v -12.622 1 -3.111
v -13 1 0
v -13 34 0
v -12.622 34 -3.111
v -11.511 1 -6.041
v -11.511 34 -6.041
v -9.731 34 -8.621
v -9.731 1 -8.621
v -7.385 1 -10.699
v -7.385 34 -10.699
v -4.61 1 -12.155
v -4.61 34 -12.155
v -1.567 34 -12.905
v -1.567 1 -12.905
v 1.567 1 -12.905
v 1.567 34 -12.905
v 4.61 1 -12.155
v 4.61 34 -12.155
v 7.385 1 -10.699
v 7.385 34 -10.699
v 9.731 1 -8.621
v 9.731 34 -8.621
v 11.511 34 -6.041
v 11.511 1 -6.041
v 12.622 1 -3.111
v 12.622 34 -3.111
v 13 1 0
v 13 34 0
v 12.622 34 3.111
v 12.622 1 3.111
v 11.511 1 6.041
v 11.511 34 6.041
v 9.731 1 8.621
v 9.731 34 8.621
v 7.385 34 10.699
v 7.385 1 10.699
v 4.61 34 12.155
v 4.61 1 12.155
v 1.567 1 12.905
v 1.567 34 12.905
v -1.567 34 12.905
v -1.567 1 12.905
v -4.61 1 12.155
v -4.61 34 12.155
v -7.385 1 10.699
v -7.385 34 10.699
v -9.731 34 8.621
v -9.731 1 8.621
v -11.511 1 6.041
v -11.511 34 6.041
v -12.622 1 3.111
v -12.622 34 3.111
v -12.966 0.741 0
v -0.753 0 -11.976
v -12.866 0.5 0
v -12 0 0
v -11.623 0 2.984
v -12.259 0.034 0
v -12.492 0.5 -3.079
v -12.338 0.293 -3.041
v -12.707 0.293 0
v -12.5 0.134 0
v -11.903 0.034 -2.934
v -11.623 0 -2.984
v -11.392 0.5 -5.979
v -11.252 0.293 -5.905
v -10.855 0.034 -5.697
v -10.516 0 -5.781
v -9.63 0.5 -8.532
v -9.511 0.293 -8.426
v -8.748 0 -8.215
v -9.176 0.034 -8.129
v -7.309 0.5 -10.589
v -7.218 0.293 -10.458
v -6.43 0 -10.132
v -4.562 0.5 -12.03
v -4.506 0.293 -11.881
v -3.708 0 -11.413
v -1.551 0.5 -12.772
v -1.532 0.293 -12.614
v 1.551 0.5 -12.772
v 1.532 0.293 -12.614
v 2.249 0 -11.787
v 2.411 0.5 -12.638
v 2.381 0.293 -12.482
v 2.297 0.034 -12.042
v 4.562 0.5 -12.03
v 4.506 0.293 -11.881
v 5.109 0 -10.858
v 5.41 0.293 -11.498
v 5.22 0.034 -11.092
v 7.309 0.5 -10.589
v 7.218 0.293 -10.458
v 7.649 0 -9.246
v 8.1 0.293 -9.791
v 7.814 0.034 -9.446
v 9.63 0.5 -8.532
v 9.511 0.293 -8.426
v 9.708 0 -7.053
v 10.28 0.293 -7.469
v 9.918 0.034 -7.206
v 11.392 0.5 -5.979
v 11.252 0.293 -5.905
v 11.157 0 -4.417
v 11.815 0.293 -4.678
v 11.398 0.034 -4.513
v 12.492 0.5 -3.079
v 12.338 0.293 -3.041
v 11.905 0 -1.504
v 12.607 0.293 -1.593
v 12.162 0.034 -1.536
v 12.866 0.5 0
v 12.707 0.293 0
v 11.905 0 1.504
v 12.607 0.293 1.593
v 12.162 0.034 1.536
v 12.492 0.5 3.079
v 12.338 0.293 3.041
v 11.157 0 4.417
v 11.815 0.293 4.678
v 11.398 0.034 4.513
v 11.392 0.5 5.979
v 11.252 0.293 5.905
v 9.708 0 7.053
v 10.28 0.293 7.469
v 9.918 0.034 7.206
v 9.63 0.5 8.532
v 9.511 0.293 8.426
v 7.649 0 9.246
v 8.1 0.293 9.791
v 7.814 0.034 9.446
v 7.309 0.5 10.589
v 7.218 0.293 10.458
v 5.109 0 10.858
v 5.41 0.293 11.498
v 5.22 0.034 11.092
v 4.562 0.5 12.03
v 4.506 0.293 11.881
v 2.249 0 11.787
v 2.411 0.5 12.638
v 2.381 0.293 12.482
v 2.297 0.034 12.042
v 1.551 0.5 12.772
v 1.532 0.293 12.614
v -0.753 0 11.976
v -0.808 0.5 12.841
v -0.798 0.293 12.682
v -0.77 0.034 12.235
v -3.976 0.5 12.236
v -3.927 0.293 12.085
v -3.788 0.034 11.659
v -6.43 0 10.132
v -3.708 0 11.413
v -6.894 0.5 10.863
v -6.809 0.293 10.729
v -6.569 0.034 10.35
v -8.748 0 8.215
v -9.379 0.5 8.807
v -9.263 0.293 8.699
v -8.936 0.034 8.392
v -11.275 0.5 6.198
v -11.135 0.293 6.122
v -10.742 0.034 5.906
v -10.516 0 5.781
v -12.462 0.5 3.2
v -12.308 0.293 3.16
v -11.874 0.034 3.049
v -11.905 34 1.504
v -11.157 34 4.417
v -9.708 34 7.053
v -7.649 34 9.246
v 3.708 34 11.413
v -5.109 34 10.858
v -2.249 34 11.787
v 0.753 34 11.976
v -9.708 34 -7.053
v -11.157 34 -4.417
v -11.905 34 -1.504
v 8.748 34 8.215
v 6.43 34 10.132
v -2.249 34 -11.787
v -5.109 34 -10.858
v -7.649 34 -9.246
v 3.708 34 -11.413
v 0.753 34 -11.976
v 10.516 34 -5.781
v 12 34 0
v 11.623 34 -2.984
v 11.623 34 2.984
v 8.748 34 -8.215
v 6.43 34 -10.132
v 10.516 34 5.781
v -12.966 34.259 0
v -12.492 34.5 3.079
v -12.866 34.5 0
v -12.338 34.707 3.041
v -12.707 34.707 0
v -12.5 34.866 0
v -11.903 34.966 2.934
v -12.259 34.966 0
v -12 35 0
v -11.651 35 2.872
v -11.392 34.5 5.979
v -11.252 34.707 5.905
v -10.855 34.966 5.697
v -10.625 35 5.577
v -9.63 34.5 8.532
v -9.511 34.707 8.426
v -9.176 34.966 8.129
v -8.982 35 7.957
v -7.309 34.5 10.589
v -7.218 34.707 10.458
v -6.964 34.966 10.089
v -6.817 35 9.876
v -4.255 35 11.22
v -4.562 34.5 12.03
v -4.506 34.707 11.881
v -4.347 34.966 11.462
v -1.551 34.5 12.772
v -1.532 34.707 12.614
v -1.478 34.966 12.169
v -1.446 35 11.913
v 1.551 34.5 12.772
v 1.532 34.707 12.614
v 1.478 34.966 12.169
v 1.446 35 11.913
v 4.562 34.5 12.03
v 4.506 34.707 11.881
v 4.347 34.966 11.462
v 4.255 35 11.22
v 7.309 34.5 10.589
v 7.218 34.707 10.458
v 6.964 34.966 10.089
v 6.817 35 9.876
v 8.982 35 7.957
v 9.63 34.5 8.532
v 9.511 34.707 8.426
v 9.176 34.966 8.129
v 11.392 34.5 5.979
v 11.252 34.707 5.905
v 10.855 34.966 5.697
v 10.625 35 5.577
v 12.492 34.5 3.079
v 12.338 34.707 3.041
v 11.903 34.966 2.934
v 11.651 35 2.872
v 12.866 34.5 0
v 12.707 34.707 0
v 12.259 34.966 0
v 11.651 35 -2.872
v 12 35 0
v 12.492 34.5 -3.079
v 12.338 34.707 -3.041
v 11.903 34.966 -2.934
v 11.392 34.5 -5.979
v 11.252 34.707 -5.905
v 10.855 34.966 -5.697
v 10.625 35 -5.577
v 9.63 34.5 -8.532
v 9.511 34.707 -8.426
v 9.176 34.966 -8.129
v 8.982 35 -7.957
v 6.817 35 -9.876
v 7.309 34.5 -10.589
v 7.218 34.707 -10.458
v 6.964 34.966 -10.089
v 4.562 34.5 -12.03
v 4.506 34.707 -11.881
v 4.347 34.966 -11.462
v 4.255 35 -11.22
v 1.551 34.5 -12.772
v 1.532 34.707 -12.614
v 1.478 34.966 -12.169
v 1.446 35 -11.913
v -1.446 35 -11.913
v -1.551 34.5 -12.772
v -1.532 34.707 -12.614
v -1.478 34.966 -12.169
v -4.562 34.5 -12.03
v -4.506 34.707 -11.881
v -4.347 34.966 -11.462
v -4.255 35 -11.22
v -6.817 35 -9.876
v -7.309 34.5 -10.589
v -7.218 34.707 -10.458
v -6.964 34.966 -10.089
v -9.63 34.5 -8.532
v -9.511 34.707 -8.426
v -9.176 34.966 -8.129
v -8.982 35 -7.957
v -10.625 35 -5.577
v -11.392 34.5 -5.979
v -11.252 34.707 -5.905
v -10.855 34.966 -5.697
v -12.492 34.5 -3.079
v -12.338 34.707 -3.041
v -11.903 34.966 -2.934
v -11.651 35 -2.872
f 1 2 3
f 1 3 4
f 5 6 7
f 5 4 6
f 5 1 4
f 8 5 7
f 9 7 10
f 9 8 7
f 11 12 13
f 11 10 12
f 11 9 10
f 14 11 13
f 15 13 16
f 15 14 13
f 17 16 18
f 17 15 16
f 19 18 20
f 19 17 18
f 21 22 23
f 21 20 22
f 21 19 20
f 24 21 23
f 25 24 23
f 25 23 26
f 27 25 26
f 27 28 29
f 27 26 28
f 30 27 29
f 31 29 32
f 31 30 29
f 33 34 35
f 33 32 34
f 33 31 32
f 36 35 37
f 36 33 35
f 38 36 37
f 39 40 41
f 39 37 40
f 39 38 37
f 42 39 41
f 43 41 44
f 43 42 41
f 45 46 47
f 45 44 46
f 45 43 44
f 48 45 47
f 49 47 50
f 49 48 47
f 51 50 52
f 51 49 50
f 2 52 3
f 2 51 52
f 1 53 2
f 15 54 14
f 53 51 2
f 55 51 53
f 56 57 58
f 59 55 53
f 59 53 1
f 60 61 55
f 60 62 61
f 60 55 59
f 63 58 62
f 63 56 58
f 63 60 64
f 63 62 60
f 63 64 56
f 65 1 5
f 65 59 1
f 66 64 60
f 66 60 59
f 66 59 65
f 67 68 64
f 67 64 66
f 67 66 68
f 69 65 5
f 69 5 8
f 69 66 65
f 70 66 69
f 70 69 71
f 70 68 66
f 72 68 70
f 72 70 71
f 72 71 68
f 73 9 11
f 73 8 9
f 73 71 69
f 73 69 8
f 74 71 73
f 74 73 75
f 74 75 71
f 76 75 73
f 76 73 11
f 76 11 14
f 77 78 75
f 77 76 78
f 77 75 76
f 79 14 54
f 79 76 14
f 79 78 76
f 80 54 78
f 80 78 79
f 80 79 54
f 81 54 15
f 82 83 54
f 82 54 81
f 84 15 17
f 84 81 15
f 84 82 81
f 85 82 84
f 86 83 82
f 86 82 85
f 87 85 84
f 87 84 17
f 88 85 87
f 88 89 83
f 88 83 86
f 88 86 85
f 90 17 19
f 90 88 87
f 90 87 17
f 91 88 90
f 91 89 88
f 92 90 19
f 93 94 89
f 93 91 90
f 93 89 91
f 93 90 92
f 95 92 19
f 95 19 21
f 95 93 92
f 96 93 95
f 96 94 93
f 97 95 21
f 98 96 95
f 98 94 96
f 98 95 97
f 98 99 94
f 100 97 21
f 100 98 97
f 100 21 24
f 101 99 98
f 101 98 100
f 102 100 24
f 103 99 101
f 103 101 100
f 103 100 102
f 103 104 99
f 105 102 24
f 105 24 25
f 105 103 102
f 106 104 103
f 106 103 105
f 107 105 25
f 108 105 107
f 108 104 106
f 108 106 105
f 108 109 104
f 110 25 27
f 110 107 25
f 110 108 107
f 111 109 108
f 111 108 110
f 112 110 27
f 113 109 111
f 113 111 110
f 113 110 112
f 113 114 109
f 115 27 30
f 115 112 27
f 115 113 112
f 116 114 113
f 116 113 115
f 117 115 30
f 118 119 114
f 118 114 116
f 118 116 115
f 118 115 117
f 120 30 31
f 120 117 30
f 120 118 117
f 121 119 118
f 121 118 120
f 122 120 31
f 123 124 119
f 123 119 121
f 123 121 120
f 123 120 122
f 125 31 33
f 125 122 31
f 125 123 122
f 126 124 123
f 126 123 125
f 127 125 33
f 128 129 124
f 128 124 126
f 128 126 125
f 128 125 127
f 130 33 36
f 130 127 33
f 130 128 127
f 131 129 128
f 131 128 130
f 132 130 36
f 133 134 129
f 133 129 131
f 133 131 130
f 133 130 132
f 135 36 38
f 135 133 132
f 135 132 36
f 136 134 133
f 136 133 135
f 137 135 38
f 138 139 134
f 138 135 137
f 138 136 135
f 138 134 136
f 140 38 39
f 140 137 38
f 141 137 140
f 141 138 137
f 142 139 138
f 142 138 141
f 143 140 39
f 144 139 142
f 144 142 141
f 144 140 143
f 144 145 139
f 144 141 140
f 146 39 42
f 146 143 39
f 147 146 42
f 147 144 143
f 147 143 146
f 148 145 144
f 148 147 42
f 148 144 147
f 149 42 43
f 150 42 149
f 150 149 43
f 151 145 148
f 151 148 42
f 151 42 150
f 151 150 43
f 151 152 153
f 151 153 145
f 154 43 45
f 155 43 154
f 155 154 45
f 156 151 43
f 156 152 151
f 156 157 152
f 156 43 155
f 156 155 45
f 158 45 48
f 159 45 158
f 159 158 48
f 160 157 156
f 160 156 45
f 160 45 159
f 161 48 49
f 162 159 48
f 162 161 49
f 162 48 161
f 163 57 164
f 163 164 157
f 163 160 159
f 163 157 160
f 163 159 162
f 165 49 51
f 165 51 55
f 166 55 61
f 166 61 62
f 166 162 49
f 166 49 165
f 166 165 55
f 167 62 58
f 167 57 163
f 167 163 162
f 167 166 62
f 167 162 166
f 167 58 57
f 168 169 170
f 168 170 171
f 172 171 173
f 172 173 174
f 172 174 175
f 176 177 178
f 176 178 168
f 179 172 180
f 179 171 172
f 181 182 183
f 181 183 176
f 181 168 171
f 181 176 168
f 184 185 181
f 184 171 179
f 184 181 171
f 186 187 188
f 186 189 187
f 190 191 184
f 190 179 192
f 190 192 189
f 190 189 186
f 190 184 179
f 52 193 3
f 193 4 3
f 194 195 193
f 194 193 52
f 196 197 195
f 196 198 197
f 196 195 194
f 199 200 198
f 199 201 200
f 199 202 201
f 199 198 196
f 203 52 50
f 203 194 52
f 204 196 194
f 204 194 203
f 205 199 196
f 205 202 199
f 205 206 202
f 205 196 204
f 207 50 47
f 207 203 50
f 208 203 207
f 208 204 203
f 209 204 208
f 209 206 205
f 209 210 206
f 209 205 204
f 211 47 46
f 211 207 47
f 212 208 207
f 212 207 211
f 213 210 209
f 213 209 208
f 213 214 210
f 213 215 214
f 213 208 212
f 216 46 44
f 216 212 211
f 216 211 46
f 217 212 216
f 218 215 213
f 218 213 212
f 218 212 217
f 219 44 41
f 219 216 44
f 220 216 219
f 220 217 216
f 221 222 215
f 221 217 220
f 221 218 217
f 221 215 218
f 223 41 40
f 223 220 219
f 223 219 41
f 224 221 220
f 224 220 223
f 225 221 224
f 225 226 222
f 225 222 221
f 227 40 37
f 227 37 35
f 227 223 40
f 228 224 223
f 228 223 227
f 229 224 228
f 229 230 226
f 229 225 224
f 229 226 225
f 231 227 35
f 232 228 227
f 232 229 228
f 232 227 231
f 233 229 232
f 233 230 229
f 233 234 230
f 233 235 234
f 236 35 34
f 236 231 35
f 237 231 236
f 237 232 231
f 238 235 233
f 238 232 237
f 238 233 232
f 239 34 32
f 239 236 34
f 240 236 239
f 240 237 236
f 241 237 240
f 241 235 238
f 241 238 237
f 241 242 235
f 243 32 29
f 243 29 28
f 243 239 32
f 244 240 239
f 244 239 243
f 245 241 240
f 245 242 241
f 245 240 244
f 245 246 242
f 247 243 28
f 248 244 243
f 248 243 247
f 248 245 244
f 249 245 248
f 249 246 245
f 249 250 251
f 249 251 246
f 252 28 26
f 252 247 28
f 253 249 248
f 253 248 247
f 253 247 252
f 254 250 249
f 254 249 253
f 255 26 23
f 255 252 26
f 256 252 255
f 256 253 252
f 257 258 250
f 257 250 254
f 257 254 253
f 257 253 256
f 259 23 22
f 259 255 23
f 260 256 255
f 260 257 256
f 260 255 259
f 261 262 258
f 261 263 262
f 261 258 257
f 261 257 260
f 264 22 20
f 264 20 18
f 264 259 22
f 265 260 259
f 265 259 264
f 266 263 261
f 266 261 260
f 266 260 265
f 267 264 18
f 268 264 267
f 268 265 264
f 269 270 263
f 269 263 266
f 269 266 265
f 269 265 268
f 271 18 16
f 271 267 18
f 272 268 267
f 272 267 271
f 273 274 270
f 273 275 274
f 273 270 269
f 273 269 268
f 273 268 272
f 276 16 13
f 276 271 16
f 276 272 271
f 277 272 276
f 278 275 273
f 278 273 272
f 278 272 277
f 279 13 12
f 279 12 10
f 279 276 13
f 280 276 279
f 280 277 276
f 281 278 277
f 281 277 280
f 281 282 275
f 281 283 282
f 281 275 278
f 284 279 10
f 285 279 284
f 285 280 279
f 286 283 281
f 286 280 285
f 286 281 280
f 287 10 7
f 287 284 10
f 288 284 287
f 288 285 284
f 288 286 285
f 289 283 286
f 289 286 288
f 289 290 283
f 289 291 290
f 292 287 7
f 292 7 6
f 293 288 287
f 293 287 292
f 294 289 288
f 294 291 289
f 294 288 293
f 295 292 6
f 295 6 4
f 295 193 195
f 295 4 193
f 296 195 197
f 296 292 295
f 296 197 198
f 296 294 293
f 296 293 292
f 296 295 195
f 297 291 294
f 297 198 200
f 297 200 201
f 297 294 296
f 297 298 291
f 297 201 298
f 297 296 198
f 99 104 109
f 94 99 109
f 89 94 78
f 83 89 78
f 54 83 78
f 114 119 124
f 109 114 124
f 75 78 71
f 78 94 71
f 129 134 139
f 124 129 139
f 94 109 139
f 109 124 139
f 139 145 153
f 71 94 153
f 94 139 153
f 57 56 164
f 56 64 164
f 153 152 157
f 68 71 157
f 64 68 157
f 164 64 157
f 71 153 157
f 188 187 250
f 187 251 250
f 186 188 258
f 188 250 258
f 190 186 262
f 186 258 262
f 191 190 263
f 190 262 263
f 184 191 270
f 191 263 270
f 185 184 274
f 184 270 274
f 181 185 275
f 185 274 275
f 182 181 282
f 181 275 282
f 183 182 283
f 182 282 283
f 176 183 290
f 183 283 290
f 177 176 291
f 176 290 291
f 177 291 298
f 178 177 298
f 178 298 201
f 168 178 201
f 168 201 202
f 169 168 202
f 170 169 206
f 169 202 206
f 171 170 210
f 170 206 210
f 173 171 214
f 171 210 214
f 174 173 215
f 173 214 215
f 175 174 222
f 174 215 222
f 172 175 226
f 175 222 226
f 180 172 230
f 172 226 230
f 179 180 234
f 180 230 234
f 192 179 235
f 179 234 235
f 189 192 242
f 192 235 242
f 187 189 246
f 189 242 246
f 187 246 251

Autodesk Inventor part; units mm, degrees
ref_plane "YZ Plane" through (0, 0, 0) normal (1, 0, 0) x (0, 1, 0)
ref_plane "XZ Plane" through (0, 0, 0) normal (0, 1, 0) x (-1, 0, 0)
ref_plane "XY Plane" through (0, 0, 0) normal (0, 0, 1) x (1, 0, 0)
sketch "スケッチ1" plane through (0, 0, 0) normal (0, 1, 0) x (-1, 0, 0)
  circle A0 centre (0, 0) radius 13
  dimension "d0" = 26
extrude "押し出し1" add sketch "スケッチ1" along normal blind 35
fillet "フィレット1" radius 1 2 edges at (13, 0, 0) (13, 35, 0)
sketch "スケッチ2" plane through (0, 35, 0) normal (0, 1, 0) x (1, 0, 0)
  circle A0 centre (0, 0) radius 12
extrude "押し出し2" cut sketch "スケッチ2" against normal blind 1
properties part number "Capacitor"
